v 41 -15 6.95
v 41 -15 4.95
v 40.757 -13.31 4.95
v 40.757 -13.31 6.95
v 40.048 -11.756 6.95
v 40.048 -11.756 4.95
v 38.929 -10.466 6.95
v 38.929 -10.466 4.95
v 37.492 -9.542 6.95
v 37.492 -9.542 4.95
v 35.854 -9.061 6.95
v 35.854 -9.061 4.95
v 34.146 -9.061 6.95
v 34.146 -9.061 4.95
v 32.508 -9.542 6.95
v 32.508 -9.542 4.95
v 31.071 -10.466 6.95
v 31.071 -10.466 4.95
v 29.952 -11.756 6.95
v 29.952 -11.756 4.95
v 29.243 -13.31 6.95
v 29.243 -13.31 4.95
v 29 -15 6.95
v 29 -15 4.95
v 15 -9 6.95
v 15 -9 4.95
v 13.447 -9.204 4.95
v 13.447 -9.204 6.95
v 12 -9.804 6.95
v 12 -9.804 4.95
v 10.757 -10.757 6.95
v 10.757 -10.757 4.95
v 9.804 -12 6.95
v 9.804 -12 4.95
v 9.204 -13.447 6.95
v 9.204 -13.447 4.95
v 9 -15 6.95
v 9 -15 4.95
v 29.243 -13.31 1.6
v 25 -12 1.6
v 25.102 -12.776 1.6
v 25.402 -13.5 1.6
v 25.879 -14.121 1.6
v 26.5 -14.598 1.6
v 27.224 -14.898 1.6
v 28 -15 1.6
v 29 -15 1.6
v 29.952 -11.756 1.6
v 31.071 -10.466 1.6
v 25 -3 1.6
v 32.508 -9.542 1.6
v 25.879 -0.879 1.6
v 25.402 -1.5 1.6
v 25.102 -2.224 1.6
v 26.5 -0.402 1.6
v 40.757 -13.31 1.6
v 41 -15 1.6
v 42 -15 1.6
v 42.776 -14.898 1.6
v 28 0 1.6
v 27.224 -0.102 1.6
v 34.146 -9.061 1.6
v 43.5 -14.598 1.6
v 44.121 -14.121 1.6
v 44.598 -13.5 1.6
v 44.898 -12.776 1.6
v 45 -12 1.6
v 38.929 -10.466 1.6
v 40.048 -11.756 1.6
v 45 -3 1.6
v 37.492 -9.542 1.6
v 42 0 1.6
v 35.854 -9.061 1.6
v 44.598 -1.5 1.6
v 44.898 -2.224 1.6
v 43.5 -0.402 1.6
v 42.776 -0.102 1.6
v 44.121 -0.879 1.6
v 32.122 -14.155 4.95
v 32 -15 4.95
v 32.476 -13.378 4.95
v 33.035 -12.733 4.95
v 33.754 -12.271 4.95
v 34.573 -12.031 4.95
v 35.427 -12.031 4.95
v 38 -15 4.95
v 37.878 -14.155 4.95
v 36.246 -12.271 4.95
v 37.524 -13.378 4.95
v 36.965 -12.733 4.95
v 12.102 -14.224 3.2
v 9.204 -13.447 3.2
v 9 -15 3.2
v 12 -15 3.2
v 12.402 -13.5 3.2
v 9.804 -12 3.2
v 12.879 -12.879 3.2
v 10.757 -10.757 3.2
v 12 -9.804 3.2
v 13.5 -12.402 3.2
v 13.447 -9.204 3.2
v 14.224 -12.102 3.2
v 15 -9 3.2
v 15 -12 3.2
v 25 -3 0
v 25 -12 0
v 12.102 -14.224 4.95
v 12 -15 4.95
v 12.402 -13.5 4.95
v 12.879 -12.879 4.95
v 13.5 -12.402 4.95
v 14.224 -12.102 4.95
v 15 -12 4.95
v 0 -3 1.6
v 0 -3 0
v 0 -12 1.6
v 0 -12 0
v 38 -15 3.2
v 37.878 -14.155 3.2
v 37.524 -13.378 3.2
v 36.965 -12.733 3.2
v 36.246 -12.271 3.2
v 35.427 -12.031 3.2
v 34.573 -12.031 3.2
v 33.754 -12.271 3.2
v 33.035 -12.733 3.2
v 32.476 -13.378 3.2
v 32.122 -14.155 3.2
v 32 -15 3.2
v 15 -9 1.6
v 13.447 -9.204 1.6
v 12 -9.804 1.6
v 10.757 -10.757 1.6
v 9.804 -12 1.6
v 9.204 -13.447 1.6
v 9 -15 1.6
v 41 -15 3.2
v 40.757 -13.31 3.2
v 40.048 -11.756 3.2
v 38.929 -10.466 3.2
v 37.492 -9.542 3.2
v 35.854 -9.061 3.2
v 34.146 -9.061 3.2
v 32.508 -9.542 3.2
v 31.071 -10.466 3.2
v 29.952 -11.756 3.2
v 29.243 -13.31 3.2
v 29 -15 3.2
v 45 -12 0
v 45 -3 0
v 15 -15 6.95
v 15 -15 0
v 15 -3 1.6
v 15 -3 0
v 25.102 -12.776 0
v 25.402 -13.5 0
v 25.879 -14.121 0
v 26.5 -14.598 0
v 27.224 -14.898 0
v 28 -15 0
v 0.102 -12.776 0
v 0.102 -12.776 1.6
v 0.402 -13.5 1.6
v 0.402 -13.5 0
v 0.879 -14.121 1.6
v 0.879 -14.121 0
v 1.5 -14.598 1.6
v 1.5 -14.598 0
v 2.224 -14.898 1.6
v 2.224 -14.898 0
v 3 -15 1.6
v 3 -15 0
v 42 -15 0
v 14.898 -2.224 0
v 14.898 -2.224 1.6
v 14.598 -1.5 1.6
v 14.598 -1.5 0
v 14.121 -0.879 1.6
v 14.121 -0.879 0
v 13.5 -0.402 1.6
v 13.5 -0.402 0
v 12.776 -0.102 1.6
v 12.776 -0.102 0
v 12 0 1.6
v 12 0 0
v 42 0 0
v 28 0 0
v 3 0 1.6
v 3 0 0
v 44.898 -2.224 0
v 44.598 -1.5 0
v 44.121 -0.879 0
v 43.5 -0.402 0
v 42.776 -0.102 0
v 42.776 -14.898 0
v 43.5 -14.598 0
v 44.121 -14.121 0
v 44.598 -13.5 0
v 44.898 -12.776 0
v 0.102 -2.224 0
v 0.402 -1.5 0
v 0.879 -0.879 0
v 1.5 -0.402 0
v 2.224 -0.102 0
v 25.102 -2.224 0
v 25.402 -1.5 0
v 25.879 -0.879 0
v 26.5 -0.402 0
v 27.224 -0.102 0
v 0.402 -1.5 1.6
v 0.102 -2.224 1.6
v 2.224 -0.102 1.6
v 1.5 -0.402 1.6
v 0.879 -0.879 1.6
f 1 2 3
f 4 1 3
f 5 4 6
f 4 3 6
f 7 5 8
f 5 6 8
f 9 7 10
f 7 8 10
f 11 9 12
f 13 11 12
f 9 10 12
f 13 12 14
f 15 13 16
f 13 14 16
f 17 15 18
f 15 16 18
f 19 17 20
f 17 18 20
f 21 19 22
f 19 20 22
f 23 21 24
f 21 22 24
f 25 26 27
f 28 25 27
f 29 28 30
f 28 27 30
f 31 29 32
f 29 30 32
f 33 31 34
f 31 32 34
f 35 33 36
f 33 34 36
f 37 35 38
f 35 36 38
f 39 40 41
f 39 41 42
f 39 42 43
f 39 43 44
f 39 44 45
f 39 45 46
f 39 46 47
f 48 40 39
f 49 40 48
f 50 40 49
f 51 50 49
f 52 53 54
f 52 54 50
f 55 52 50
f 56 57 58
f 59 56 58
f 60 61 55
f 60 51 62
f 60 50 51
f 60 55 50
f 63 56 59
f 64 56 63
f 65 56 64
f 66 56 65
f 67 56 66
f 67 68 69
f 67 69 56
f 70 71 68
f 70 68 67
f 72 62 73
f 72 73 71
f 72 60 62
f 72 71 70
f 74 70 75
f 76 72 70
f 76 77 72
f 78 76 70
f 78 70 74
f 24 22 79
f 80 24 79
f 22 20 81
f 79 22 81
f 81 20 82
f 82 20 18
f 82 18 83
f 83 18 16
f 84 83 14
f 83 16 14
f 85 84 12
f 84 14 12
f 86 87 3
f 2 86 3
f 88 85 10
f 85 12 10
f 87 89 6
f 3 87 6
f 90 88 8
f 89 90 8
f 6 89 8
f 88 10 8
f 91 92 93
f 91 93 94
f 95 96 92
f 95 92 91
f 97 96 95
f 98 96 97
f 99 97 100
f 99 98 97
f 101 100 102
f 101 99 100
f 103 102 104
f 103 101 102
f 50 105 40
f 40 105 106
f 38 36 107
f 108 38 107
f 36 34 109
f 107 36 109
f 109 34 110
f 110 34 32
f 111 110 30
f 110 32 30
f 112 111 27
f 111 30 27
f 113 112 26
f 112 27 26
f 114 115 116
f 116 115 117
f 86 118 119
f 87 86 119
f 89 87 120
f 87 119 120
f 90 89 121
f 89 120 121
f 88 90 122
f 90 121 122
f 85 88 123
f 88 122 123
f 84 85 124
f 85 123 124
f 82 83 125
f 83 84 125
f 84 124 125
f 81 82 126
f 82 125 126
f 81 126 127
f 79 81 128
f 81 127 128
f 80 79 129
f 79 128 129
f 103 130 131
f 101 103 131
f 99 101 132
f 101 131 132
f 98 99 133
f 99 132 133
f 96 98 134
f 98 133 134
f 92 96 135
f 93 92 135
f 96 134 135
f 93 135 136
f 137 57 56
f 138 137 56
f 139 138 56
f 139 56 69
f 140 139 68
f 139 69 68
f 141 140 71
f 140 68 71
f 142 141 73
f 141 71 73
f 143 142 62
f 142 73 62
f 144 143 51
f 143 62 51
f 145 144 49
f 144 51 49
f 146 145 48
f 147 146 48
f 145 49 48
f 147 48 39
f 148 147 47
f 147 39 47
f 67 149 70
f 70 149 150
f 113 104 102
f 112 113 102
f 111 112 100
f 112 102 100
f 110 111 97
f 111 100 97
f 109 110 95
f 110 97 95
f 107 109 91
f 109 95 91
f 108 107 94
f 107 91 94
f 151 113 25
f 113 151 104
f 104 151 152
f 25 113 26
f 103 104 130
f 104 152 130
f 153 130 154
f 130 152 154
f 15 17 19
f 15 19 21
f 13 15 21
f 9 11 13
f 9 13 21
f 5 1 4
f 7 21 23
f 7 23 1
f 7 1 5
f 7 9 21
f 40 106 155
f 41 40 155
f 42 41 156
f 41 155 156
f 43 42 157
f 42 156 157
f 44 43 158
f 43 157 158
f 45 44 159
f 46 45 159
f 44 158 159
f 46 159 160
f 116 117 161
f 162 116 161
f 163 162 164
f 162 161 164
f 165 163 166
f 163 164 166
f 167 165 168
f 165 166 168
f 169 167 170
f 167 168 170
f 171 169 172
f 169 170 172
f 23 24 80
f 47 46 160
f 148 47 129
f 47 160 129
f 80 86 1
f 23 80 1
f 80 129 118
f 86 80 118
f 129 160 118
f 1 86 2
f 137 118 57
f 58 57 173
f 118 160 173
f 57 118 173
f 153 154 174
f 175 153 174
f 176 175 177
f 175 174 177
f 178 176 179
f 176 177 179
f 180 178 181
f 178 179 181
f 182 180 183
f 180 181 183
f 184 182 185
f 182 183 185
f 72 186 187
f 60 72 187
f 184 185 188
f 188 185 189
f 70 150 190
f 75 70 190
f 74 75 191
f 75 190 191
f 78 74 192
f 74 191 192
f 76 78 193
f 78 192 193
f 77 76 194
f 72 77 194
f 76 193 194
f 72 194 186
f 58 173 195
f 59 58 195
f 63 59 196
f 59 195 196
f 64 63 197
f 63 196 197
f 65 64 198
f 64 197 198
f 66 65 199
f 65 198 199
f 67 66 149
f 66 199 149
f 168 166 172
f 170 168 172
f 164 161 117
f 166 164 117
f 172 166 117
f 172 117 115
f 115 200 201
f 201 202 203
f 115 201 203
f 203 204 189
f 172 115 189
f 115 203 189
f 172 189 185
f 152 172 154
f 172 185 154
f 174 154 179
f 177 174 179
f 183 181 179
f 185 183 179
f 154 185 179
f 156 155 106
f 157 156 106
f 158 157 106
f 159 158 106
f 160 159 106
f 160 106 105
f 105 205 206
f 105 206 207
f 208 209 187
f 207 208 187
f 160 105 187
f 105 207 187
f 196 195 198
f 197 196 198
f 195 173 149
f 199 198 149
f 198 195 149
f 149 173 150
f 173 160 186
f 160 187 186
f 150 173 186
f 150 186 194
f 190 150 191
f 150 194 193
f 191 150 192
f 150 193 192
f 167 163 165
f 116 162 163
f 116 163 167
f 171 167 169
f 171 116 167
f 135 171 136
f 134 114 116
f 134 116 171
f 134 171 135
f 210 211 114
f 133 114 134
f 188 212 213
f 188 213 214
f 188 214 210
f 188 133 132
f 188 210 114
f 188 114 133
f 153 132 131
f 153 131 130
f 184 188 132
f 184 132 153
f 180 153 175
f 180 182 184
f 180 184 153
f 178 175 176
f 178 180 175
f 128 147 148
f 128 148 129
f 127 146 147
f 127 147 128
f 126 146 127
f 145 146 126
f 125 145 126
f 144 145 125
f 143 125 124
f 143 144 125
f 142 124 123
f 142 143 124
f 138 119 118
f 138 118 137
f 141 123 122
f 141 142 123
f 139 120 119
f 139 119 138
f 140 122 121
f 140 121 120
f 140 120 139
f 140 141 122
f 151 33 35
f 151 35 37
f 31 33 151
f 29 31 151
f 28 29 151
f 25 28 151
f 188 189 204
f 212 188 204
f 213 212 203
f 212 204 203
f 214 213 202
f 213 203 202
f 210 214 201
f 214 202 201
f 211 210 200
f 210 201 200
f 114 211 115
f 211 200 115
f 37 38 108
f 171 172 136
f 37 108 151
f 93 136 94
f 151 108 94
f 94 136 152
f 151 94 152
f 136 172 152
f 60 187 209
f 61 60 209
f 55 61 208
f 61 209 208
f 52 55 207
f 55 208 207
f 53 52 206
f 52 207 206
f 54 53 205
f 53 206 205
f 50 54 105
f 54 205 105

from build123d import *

# Parameters (mm, degrees)
F5_DEPTH = 1.6
F6_DEPTH = 3.2
F7_DEPTH = 6.95
F8_START = 4.95
F8_DEPTH = 2


with BuildPart() as f5:
    # F0 (on Top) → F5 (new body)
    with BuildSketch(Plane.XY):
        with BuildLine():
            Line((12, 0), (3, 0))
            ThreePointArc((3, 0), (0.8786796564, -0.8786796564), (0, -3))
            Line((0, -3), (0, -12))
            ThreePointArc((0, -12), (0.8786796564, -14.1213203436), (3, -15))
            Line((3, -15), (9, -15))
            ThreePointArc((9, -15), (10.7573593129, -10.7573593129), (15, -9))
            Line((15, -9), (15, -3))
            ThreePointArc((15, -3), (14.1213203436, -0.8786796564), (12, 0))
        make_face()
    extrude(amount=F5_DEPTH)

    # F0 (on Top) → F6 (join)
    with BuildSketch(Plane.XY):
        with BuildLine():
            Line((15, -12), (15, -9))
            ThreePointArc((15, -9), (10.7573593129, -10.7573593129), (9, -15))
            Line((9, -15), (12, -15))
            ThreePointArc((12, -15), (12.8786796564, -12.8786796564), (15, -12))
        make_face()
    extrude(amount=F6_DEPTH)

    # F0 (on Top) → F7 (join)
    with BuildSketch(Plane.XY):
        with BuildLine():
            Line((15, -15), (15, -12))
            ThreePointArc((15, -12), (12.8786796564, -12.8786796564), (12, -15))
            Line((12, -15), (15, -15))
        make_face()
    extrude(amount=F7_DEPTH)

    # F0 (on Top) → F8 (join)
    with BuildSketch(Plane.XY.offset(F8_START)):
        with BuildLine():
            Line((15, -12), (15, -9))
            ThreePointArc((15, -9), (10.7573593129, -10.7573593129), (9, -15))
            Line((9, -15), (12, -15))
            ThreePointArc((12, -15), (12.8786796564, -12.8786796564), (15, -12))
        make_face()
    extrude(amount=F8_DEPTH)


with BuildPart() as f5b:
    # F0 (on Top) → F5, piece 2 (new body)
    with BuildSketch(Plane.XY):
        with BuildLine():
            Line((42, 0), (28, 0))
            ThreePointArc((28, 0), (25.8786796564, -0.8786796564), (25, -3))
            Line((25, -3), (25, -12))
            ThreePointArc((25, -12), (25.8786796564, -14.1213203436), (28, -15))
            Line((28, -15), (29, -15))
            ThreePointArc((29, -15), (35, -9), (41, -15))
            Line((41, -15), (42, -15))
            ThreePointArc((42, -15), (44.1213203436, -14.1213203436), (45, -12))
            Line((45, -12), (45, -3))
            ThreePointArc((45, -3), (44.1213203436, -0.8786796564), (42, 0))
        make_face()
    extrude(amount=F5_DEPTH)

    # F0 (on Top) → F6, piece 2 (join)
    with BuildSketch(Plane.XY):
        with BuildLine():
            ThreePointArc((41, -15), (35, -9), (29, -15))
            Line((29, -15), (32, -15))
            ThreePointArc((32, -15), (35, -12), (38, -15))
            Line((38, -15), (41, -15))
        make_face()
    extrude(amount=F6_DEPTH)

    # F0 (on Top) → F7, piece 2 (join)
    with BuildSketch(Plane.XY):
        with BuildLine():
            ThreePointArc((38, -15), (35, -12), (32, -15))
            Line((32, -15), (38, -15))
        make_face()
    extrude(amount=F7_DEPTH)

    # F0 (on Top) → F8, piece 2 (join)
    with BuildSketch(Plane.XY.offset(F8_START)):
        with BuildLine():
            ThreePointArc((41, -15), (35, -9), (29, -15))
            Line((29, -15), (32, -15))
            ThreePointArc((32, -15), (35, -12), (38, -15))
            Line((38, -15), (41, -15))
        make_face()
    extrude(amount=F8_DEPTH)


solid = Compound([f5.part, f5b.part])
